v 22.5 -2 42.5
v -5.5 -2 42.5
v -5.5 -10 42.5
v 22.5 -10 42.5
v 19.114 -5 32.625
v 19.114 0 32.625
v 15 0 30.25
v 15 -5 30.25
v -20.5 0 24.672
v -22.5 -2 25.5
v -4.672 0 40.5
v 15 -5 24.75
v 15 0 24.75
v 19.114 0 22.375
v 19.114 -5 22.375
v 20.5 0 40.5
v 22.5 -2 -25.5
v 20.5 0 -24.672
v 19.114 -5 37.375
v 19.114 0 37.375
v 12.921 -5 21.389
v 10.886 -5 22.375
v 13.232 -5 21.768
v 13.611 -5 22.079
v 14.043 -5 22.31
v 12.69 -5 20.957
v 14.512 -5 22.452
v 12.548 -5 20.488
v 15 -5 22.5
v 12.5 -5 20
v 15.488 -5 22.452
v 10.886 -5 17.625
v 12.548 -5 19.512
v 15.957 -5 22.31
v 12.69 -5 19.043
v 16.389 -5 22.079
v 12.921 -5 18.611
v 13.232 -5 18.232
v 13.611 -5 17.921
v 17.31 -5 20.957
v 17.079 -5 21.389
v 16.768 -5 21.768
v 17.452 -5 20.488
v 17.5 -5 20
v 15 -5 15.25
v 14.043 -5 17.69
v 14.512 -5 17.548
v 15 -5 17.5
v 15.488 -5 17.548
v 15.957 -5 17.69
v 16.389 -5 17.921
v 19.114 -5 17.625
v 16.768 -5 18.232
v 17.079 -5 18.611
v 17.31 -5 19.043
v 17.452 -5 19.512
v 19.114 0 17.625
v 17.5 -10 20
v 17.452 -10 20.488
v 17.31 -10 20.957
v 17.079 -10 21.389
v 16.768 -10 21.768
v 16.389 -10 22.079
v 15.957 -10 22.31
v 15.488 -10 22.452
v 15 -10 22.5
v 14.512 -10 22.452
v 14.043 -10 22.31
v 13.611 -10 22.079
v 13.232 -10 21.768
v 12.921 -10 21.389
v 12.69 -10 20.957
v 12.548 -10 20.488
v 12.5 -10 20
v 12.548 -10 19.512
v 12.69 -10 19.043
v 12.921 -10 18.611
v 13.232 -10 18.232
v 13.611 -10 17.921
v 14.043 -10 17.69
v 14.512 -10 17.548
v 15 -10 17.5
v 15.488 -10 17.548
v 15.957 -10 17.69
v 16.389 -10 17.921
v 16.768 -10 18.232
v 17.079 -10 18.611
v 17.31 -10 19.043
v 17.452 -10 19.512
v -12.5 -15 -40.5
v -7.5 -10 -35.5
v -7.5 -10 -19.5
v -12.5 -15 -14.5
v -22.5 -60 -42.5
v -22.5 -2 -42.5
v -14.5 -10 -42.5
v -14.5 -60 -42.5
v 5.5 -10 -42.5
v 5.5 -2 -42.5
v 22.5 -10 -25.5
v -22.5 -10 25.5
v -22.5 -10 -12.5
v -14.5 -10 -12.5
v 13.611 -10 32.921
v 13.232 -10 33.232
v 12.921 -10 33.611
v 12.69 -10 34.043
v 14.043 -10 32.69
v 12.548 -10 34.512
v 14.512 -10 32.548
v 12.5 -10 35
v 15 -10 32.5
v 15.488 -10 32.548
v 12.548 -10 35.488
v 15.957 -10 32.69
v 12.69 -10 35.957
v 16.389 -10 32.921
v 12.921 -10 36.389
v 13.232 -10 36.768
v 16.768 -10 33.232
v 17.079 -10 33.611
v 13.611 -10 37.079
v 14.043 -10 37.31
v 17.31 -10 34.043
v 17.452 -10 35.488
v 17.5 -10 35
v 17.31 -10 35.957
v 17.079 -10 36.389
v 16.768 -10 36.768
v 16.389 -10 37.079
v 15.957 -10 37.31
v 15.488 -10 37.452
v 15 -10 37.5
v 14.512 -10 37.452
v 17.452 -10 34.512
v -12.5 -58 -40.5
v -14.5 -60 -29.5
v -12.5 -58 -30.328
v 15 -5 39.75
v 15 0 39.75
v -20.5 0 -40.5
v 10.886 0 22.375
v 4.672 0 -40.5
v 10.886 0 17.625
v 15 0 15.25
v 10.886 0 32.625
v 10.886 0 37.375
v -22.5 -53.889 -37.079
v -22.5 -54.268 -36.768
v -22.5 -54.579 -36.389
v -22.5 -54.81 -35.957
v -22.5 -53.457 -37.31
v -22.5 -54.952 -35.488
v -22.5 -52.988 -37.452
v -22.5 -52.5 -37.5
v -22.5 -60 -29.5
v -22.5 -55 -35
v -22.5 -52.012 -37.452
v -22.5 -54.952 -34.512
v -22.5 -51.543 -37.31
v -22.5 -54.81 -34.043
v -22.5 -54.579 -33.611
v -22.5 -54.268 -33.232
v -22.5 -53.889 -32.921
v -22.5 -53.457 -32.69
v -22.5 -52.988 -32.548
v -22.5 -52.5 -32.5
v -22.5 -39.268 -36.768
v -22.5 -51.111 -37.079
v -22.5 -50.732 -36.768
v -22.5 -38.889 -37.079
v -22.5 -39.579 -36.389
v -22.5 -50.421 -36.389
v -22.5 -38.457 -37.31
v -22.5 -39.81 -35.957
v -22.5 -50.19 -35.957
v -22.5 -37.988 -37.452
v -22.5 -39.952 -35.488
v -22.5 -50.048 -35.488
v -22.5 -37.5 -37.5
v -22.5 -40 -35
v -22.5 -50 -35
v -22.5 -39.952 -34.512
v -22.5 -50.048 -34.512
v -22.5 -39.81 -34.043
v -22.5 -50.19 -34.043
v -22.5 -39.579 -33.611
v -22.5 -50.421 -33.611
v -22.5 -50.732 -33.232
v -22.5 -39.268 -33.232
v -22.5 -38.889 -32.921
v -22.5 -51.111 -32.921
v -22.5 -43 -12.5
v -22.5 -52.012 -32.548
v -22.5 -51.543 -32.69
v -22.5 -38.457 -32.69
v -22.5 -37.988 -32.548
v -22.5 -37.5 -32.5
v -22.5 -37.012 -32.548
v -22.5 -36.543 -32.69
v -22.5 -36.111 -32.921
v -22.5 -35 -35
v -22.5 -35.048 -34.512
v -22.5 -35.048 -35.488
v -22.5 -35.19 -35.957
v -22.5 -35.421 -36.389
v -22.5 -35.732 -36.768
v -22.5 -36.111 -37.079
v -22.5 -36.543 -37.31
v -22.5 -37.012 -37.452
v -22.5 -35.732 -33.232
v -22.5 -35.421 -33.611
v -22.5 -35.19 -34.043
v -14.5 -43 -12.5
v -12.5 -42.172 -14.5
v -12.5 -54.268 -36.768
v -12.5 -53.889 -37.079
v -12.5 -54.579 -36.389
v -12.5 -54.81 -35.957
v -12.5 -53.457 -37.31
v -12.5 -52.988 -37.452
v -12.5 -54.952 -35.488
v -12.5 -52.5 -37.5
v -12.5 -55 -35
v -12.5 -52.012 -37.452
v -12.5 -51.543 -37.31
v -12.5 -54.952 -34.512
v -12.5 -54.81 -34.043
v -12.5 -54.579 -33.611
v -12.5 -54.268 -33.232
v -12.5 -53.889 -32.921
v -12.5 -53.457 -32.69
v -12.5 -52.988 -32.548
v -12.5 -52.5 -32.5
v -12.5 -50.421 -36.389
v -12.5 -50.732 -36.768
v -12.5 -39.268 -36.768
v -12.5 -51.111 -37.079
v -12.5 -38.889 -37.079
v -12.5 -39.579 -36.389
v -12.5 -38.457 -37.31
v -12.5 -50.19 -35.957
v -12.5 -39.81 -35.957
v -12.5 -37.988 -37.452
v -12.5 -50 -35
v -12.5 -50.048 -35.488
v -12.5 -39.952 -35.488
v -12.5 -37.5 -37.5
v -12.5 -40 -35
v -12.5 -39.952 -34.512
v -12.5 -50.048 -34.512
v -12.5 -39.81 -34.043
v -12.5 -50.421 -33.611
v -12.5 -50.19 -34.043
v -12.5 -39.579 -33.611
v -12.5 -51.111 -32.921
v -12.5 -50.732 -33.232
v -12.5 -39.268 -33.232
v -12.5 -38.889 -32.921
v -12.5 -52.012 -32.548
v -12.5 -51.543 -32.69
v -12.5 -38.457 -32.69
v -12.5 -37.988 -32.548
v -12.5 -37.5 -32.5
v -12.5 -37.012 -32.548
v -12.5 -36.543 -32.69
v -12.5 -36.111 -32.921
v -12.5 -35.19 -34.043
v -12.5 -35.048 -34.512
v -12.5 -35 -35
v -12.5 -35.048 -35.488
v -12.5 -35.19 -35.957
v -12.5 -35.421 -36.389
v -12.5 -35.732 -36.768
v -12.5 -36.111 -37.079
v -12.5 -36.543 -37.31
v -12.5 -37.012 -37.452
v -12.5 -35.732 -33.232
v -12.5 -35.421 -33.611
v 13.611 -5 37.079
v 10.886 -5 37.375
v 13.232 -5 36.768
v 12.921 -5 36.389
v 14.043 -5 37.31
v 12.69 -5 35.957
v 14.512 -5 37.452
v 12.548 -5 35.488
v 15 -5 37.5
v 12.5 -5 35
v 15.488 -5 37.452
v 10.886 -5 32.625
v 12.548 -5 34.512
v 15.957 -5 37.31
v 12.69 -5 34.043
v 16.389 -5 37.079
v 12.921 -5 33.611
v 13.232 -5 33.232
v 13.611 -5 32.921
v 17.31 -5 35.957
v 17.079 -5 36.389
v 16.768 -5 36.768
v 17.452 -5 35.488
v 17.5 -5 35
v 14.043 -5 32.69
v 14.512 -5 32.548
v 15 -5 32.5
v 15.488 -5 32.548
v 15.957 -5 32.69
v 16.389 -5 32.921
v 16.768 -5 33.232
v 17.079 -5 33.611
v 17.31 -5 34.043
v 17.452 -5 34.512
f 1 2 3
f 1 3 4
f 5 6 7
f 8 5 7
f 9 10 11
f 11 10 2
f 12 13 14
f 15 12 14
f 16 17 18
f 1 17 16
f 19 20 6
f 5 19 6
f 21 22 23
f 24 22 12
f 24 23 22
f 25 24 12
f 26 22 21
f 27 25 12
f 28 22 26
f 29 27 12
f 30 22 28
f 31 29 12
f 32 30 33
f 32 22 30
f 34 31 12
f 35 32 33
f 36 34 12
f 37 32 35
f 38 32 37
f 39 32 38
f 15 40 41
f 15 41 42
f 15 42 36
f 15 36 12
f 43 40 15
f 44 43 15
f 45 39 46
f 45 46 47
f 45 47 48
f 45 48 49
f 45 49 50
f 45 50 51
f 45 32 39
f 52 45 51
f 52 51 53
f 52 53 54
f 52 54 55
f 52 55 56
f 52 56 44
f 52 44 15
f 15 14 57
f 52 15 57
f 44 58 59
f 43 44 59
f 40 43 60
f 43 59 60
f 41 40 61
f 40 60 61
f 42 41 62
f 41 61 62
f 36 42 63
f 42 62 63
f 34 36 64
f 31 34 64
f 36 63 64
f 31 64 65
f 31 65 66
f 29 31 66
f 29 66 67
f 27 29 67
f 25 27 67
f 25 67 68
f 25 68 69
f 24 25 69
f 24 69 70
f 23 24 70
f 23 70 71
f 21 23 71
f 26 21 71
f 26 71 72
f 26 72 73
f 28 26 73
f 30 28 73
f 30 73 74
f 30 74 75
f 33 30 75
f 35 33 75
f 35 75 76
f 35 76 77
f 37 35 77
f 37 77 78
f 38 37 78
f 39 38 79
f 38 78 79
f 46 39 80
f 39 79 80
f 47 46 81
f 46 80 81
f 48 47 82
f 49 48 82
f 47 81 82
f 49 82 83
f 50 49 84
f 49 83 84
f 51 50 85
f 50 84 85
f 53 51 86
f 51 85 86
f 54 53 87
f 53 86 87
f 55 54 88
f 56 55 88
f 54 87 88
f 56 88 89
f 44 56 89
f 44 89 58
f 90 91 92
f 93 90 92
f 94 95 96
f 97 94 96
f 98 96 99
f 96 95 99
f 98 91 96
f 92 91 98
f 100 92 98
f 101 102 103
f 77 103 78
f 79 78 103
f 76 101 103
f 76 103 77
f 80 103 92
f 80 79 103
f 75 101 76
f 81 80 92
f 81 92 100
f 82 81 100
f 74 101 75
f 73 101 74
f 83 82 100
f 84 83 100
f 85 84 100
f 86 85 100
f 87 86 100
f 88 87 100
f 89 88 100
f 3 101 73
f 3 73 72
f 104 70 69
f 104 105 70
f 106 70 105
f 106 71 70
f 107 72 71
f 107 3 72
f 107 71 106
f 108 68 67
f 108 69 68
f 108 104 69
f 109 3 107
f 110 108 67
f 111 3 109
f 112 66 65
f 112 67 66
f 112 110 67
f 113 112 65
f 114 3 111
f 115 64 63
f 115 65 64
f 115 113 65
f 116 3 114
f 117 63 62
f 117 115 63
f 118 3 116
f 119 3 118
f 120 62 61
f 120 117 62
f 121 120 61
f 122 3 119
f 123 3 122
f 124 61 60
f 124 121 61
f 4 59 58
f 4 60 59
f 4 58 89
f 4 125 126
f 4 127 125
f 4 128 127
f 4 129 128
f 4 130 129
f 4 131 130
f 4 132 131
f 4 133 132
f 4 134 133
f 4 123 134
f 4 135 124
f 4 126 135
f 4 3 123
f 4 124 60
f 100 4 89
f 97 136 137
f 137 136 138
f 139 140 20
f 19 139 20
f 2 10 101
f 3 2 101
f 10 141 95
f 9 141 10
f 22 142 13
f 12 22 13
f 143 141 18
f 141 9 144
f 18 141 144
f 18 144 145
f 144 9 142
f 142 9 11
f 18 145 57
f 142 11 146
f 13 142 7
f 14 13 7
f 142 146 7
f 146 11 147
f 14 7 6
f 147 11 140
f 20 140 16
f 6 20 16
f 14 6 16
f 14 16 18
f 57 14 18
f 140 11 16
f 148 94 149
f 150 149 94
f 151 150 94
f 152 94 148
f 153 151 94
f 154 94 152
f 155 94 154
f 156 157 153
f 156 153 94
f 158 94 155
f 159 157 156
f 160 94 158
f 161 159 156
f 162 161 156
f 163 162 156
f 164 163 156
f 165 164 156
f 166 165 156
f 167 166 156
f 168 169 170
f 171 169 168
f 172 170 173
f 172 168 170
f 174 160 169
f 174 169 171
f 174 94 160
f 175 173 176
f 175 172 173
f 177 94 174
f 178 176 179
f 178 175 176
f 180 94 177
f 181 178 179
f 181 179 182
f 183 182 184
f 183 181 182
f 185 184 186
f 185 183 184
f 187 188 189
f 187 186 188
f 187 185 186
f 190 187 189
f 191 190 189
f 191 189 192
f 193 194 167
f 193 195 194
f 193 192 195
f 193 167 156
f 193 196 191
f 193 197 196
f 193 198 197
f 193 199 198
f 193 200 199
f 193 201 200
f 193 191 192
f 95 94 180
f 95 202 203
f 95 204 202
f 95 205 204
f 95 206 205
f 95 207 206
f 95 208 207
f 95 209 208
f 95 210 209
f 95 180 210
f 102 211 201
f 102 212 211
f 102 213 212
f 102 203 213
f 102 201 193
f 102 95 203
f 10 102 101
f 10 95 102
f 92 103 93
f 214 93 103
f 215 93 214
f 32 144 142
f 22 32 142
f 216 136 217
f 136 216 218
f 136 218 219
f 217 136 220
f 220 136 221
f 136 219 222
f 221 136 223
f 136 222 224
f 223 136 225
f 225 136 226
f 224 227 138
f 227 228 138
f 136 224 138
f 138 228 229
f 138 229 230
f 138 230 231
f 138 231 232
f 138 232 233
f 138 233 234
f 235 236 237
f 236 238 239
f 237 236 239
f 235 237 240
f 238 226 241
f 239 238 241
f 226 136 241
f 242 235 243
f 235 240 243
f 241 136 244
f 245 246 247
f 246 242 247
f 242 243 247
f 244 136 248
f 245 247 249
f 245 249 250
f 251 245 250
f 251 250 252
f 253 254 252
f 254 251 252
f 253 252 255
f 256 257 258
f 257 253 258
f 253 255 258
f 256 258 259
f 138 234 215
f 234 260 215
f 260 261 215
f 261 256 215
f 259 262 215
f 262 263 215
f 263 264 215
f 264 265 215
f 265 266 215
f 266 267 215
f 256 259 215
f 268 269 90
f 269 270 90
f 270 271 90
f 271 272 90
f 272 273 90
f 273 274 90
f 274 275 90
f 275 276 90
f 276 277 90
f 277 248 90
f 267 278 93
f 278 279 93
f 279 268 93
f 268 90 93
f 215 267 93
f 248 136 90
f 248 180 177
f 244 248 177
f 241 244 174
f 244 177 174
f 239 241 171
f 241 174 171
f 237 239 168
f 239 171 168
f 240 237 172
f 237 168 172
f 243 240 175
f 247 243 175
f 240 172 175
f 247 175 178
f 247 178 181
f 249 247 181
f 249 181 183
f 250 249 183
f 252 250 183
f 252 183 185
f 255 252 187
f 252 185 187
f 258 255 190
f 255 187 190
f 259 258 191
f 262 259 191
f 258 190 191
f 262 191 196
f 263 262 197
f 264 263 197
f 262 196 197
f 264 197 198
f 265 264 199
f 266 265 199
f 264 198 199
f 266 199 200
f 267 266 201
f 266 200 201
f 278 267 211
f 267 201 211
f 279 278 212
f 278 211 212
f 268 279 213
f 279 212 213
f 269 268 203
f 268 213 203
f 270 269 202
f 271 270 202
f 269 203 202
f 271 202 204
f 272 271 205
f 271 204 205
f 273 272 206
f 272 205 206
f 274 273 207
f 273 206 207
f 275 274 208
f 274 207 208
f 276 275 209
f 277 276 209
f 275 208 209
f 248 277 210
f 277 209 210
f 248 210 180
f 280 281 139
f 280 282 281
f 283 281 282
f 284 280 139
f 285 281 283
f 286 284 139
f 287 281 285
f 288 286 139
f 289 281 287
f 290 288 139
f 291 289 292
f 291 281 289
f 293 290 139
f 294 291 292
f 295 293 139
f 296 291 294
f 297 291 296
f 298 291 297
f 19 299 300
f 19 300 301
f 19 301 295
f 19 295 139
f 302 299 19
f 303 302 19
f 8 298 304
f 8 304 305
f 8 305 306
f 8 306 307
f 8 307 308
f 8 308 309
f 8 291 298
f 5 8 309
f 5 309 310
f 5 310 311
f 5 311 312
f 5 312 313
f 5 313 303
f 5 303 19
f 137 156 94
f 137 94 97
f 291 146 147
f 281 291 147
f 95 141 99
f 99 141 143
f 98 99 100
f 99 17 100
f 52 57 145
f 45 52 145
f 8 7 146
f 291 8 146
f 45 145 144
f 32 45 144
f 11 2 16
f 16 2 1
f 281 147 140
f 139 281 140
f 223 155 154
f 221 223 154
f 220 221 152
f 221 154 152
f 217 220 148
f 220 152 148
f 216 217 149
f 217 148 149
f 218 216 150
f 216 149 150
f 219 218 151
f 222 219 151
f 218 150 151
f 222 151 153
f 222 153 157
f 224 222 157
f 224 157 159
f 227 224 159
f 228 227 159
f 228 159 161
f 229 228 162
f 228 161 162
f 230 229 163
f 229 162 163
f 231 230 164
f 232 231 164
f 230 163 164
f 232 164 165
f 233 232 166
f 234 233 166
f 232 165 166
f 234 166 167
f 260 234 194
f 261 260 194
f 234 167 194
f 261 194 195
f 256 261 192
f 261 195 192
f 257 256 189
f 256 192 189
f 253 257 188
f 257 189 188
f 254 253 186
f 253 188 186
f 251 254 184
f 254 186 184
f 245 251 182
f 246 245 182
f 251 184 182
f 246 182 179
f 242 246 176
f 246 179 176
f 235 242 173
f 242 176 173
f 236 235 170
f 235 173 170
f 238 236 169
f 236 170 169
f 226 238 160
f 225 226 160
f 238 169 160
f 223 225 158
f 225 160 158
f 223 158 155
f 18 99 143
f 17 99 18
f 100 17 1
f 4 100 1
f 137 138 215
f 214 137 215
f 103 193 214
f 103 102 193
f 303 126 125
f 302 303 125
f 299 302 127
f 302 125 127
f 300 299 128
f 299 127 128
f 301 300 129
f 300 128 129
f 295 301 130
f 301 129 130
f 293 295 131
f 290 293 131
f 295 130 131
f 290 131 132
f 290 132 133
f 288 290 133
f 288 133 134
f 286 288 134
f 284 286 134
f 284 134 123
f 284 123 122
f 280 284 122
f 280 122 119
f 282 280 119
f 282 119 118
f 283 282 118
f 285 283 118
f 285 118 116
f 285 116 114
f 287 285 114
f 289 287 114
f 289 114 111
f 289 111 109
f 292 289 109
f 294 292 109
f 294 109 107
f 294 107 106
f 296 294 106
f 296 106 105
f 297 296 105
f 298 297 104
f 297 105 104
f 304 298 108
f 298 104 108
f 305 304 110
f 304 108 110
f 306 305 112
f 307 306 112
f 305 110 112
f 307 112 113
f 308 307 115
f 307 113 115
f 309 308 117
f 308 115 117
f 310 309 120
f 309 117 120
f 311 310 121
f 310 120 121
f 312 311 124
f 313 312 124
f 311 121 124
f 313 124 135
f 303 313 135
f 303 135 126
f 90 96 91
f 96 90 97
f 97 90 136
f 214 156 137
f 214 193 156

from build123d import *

# Parameters (mm, degrees)
SKETCH_W        = 45
SKETCH_H        = 85
PAD_DEPTH       = 10
SKETCH001_W     = 10
SKETCH001_H     = 30
PAD001_DEPTH    = 50
SKETCH002_R     = 2.5
POCKET_DEPTH    = 10
SKETCH003_R     = 2.5
POCKET001_DEPTH = 11
POCKET002_DEPTH = 5
CHAMFER_SIZE    = 17
CHAMFER001_SIZE = 2
CHAMFER002_SIZE = 5


with BuildPart() as part:
    # Sketch → Pad (new body)
    with BuildSketch(Plane.XZ):
        Rectangle(SKETCH_W, SKETCH_H)
    extrude(amount=PAD_DEPTH)

    # Sketch001 (on Face6 of Pad) → Pad001 (join)
    with BuildSketch(Plane.XZ.offset(10)):
        with Locations((-17.5, -27.5)):
            Rectangle(SKETCH001_W, SKETCH001_H)
    extrude(amount=PAD001_DEPTH)

    # Sketch002 (on Face7 of Pad001) → Pocket (cut)
    with BuildSketch(Plane(origin=(-22.5, 0, 0), x_dir=(0, 0, -1), z_dir=(-1, 0, 0))):
        with Locations((35, 52.5)):
            Circle(SKETCH002_R)
        with Locations((35, 37.5)):
            Circle(SKETCH002_R)
    extrude(amount=-POCKET_DEPTH, mode=Mode.SUBTRACT)

    # Sketch003 (on Face5 of Pocket) → Pocket001 (cut)
    with BuildSketch(Plane.XZ.offset(10)):
        with Locations((15, 35)):
            Circle(SKETCH003_R)
        with Locations((15, 20)):
            Circle(SKETCH003_R)
    extrude(amount=-POCKET001_DEPTH, mode=Mode.SUBTRACT)

    # Sketch004 (on Face4 of Pocket001) → Pocket002 (cut)
    with BuildSketch(Plane(origin=(0, 0, 0), x_dir=(1, 0, 0), z_dir=(0, 1, 0))):
        Polygon((15, -24.75), (19.113621, -22.375), (19.113621, -17.625), (15, -15.25), (10.886379, -17.625), (10.886379, -22.375), align=None)
        Polygon((19.113621, -37.375), (19.113621, -32.625), (15, -30.25), (10.886379, -32.625), (10.886379, -37.375), (15, -39.75), align=None)
    extrude(amount=-POCKET002_DEPTH, mode=Mode.SUBTRACT)

    # Chamfer
    chamfer_edges = [part.edges().sort_by_distance(p)[0] for p in [
        (22.5, -5, -42.5),
        (-22.5, -5, 42.5),
        (-17.5, -60, -12.5),
    ]]
    chamfer(chamfer_edges, length=CHAMFER_SIZE)

    # Chamfer001
    chamfer001_edges = [part.edges().sort_by_distance(p)[0] for p in [
        (-12.5, -26.5, -12.5),
        (-12.5, -51.5, -21),
        (-12.5, -60, -36),
        (-12.5, -35, -42.5),
        (22.5, 0, 8.5),
        (14, 0, -34),
        (-22.5, 0, -8.5),
        (-14, 0, 34),
        (8.5, 0, 42.5),
        (-8.5, 0, -42.5),
    ]]
    chamfer(chamfer001_edges, length=CHAMFER001_SIZE)

    # Chamfer002
    chamfer002_edges = [part.edges().sort_by_distance(p)[0] for p in [
        (-12.5, -10, -27.5),
    ]]
    chamfer(chamfer002_edges, length=CHAMFER002_SIZE)


solid = part.part
